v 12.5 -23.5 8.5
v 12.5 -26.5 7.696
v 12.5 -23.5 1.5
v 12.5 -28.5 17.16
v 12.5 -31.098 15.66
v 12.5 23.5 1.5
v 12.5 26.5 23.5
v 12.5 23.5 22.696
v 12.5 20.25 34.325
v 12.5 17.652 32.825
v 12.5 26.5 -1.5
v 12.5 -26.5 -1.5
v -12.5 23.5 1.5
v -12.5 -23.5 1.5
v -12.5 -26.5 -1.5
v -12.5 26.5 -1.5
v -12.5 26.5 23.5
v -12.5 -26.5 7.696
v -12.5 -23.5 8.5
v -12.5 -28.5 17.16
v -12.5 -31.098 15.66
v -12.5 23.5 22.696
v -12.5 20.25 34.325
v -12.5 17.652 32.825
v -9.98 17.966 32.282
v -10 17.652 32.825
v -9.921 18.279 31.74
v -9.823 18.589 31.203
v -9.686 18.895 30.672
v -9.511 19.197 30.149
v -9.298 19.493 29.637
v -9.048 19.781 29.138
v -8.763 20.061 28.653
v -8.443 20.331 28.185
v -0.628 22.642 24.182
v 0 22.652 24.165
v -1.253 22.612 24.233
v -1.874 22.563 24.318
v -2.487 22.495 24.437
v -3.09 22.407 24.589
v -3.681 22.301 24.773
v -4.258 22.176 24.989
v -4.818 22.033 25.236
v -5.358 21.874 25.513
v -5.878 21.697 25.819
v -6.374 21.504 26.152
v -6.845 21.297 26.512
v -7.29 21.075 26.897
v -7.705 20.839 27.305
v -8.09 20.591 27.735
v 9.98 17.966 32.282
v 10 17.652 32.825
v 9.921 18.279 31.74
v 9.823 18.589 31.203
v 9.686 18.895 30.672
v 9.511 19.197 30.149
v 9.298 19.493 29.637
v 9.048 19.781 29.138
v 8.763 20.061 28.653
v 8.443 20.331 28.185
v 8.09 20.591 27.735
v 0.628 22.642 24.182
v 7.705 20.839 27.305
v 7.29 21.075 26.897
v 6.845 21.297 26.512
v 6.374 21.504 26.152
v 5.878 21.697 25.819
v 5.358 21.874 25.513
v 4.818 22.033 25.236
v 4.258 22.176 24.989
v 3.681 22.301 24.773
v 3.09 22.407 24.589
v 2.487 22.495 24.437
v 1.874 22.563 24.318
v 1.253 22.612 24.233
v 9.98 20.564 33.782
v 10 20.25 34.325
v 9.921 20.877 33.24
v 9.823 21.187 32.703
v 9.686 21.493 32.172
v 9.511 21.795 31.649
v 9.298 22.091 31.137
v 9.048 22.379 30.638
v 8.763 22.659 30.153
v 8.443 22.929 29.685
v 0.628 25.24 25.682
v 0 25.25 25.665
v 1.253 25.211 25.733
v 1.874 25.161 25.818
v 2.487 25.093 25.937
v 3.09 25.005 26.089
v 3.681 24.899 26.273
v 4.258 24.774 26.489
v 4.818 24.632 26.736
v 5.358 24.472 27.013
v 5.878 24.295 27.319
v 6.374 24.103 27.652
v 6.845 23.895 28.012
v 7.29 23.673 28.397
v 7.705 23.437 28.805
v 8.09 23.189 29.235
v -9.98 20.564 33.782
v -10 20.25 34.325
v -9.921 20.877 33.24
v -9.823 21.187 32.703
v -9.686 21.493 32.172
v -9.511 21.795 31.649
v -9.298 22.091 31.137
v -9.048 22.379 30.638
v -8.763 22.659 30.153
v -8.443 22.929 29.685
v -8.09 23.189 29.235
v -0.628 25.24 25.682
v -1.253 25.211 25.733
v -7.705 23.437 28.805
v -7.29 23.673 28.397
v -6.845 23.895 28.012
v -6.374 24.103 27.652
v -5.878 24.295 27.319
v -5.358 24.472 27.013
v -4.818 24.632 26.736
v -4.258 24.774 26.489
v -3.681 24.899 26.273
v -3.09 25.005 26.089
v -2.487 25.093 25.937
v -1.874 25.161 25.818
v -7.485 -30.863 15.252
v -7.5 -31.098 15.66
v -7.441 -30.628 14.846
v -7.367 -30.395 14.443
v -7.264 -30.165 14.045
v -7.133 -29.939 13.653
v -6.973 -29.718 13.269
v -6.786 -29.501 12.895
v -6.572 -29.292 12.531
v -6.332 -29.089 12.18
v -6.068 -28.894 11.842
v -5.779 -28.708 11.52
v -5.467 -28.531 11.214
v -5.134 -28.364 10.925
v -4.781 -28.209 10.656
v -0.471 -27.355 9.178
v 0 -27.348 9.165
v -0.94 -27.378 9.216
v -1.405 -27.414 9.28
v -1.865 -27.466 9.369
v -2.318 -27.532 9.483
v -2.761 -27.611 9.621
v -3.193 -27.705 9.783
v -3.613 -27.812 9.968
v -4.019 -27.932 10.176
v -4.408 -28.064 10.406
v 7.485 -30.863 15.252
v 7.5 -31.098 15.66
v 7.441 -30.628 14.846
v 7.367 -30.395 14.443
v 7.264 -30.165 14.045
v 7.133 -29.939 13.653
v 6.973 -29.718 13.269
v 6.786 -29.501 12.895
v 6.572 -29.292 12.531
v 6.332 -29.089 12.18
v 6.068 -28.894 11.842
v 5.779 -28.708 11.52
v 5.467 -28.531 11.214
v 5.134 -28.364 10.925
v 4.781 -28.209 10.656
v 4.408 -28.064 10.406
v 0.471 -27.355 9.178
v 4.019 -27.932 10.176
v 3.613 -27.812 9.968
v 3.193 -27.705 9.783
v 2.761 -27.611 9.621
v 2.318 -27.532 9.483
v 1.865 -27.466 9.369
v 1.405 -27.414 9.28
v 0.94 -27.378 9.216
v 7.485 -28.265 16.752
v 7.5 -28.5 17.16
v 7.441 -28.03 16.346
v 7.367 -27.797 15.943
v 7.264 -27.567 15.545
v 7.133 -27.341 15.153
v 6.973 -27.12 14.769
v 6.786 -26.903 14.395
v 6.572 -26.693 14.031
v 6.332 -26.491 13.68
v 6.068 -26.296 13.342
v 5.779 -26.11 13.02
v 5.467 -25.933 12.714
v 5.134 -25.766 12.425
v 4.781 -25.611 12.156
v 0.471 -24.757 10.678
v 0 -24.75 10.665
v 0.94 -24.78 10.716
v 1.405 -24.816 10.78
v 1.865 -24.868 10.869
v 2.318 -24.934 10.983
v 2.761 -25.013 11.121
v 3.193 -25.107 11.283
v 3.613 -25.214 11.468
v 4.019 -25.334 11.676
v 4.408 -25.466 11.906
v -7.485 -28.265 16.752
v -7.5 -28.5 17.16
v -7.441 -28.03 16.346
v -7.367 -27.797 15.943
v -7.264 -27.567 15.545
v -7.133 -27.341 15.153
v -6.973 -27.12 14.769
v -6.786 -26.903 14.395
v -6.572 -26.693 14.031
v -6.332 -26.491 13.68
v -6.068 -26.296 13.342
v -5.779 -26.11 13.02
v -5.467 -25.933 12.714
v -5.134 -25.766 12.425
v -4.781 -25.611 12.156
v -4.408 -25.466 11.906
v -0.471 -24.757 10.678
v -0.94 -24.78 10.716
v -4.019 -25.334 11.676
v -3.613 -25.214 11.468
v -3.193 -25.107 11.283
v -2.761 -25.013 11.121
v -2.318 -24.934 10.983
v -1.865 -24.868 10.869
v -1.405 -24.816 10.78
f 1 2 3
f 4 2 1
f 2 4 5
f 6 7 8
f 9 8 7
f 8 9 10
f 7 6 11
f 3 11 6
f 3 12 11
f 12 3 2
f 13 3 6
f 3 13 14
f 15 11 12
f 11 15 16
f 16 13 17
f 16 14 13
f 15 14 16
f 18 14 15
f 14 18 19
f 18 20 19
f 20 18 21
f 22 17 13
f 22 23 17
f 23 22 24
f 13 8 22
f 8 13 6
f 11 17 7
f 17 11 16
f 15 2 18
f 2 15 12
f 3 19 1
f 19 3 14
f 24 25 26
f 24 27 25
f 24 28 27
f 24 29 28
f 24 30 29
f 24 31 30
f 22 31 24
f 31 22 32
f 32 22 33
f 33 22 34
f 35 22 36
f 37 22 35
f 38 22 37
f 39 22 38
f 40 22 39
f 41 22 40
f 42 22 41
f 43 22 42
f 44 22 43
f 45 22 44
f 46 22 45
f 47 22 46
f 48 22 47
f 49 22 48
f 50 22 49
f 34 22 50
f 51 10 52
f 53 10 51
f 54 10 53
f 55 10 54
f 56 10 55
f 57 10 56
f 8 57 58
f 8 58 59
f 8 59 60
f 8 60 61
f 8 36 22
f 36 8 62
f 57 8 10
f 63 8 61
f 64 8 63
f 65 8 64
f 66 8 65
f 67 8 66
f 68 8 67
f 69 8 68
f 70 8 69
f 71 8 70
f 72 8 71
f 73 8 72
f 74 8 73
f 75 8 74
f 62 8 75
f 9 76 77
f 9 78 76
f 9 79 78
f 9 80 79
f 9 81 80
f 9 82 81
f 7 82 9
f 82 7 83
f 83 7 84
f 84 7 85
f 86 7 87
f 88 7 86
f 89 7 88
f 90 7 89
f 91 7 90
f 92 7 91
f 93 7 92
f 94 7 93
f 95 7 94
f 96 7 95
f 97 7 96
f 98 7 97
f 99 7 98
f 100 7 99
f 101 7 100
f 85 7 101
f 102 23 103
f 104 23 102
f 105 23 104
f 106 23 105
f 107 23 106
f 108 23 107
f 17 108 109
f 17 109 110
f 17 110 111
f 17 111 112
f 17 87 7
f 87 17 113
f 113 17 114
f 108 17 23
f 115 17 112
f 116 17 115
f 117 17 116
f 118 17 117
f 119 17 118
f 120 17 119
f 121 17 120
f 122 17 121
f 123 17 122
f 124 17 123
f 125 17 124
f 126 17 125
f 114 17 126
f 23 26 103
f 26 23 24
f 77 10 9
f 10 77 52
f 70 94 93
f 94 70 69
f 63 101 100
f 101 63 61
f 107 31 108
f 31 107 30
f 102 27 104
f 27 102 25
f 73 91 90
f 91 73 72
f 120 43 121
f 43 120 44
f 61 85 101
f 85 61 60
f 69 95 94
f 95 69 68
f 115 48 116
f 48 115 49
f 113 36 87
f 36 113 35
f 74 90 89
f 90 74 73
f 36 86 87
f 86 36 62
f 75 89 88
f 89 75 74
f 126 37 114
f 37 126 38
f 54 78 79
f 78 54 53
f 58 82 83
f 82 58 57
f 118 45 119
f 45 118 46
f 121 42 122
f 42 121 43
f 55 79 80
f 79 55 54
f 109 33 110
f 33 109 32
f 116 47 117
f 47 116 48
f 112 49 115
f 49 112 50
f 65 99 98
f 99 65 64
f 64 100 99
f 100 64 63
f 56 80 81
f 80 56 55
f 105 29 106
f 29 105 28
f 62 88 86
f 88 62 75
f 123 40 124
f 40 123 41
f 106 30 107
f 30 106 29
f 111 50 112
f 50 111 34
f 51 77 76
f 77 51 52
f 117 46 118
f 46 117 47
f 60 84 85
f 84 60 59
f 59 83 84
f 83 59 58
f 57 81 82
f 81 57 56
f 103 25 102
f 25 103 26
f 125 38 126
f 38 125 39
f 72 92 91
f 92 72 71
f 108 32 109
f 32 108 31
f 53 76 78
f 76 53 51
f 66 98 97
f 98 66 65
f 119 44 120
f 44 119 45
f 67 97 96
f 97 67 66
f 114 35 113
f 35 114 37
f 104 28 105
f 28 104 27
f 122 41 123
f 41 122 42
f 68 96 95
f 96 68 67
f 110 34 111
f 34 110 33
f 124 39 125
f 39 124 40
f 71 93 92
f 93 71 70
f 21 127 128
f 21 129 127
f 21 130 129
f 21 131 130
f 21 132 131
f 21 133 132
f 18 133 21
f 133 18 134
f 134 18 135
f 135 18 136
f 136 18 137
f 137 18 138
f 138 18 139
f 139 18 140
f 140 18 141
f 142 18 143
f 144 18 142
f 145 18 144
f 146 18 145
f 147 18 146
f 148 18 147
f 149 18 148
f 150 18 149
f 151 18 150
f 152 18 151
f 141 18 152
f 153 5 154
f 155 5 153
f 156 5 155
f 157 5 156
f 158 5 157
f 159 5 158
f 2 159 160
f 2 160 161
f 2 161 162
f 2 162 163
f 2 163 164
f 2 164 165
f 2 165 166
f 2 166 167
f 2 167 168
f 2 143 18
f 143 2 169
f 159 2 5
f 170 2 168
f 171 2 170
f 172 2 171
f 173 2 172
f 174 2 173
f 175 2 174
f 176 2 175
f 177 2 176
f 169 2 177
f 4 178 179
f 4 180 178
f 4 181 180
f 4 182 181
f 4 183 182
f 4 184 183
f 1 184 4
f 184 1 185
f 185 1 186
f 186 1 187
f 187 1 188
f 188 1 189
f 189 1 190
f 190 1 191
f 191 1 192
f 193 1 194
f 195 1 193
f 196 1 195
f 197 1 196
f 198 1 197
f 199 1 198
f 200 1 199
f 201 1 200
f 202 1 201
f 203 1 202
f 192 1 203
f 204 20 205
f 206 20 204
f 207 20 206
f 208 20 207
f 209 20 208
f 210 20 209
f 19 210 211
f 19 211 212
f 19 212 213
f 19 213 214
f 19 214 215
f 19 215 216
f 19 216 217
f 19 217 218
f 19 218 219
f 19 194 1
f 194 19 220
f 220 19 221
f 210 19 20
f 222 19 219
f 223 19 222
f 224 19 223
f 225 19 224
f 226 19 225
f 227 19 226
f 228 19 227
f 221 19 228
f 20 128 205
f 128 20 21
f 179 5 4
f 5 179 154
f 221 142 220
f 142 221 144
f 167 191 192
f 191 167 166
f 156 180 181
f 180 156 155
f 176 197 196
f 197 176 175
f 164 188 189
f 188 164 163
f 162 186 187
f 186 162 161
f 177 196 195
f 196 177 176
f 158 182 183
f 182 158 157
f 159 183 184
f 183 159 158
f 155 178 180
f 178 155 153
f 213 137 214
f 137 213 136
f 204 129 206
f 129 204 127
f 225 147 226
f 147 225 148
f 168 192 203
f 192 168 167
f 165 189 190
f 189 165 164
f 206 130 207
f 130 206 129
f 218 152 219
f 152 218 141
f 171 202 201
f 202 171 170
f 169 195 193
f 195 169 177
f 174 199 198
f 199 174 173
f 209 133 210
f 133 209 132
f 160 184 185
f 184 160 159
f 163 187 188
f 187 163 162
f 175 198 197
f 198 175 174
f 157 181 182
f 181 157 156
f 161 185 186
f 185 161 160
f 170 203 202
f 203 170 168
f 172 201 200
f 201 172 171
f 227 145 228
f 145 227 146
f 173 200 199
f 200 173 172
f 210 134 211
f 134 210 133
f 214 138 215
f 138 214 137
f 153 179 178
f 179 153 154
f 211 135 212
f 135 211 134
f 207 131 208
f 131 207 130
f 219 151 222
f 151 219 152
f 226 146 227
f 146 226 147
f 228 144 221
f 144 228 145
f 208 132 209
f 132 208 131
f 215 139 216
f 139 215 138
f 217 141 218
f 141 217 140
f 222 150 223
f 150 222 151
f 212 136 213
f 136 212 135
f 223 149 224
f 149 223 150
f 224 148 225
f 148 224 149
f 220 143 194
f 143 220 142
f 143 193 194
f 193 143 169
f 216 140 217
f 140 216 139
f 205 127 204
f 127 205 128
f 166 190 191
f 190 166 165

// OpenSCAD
lengthOverall = 50; //Overall length of part
widthOverall = 25; //Width of part
partThickness = 3; //Thickness
partAngle = 60; //Angles between 0 and 90 degrees
mainWallHeight = 25; //Height of main vertical wall
secondWallScale = 0.4; //Height of second vertical wall % of main wall
ironMajorDiameter = 20; //diameter of soldering iron grip near the hot end
ironMinorDiameter = 15; //diameter of soldering iron grip near electrical cord

module SolderStand(thickness,Width, Length,Height, smallWallScale, Angle,Diameter, minorDiameter){
    
    
    Angle = 180-Angle;
    echo(Angle);
    //Check to ensure a valid angle has been entered
    if ((Angle>=90) && (Angle <=180)){
    secondWallHeight = Height*smallWallScale;
    echo(secondWallHeight);
    union(){
    union(){
    union(){
    //Base of Stand       
    cube(size=[Width,Length,thickness], center=true);
    //Tall Side Wall    
    translate([0, Length*0.5,Height*0.5-thickness*0.5]){
        rotate([90,0,0]){
            cube(size=[Width,Height,thickness], center=true);
        }
    }
    }
    
    //Short Side Wall 
    translate([0,-(Length*0.5),secondWallHeight*0.5-thickness*0.5]){
        rotate([90,0,0]){
        cube(size=[Width, secondWallHeight, thickness], center=true);
        }
    }
    }
    //Top Soldering Iron Rest   
    translate([-Width*0.5,Length*0.5+thickness*0.5, Height-thickness*0.5]){
        rotate([Angle,0,0])
        {
        difference(){
        cube(size=[Width, Height*0.5, thickness]);
        translate([Width*0.5,Height*0.5,0]){
        cylinder(r=Diameter*0.5,h=thickness);
        }
        }
        }
    }
    //Bottom Soldering Iron Rest
    translate([-Width*0.5, -(Length*0.5)+thickness*0.5,secondWallHeight-thickness*0.5]){
        rotate([Angle,0,0]){
            difference(){
            cube(size=[Width, secondWallHeight, thickness]);
            
            
            translate([Width*0.5,secondWallHeight,0]){
            cylinder(r=minorDiameter*0.5,h=thickness);
            }
            }
            
        }
    }
    }
    }
    //Error message if valid angle not entered
    else
    {
        echo("Use valid angle");
        }
}

SolderStand(partThickness,widthOverall, lengthOverall, mainWallHeight, secondWallScale, partAngle, ironMajorDiameter, ironMinorDiameter, $fn=100);
